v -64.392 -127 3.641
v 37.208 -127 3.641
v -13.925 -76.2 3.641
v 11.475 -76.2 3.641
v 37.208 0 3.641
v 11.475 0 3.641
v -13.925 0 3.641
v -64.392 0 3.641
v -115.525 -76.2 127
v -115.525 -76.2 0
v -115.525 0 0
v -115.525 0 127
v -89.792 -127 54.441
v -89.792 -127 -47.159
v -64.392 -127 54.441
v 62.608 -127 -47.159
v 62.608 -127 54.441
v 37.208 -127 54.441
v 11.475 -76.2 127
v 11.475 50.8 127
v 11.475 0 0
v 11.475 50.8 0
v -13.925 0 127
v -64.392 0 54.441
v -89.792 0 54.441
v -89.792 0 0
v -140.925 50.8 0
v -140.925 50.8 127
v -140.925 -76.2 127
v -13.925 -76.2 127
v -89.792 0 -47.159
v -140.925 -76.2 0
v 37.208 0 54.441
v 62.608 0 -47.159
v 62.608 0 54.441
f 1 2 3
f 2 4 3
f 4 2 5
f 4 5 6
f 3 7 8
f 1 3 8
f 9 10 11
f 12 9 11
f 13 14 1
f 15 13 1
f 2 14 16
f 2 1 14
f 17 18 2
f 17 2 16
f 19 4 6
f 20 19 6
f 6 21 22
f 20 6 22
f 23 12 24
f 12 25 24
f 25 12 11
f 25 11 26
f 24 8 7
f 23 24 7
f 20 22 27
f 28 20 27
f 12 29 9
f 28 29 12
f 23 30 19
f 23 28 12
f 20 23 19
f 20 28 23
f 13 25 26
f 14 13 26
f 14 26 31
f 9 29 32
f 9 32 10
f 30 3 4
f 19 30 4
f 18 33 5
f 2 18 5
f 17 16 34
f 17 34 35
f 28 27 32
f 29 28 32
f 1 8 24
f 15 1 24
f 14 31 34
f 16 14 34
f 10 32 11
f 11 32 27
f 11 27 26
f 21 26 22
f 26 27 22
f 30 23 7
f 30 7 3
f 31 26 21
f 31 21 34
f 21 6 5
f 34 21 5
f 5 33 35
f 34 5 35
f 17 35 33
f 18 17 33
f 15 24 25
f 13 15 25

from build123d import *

# Parameters (mm, degrees)
F1_DEPTH = 127
F3_DEPTH = 127


with BuildPart() as f1:
    # F0 (on Front) → F1 (new body)
    with BuildSketch(Plane.XZ):
        Polygon((-89.792244, 54.44082), (-89.792244, -47.15918), (62.607756, -47.15918), (62.607756, 54.44082), (37.207756, 54.44082), (37.207756, 3.64082), (-64.392244, 3.64082), (-64.392244, 54.44082), align=None)
    extrude(amount=F1_DEPTH)

    # F2 (on Top) → F3 (join)
    with BuildSketch(Plane.XY):
        Polygon((11.475189, 50.8), (-140.924811, 50.8), (-140.924811, -76.2), (-115.524811, -76.2), (-115.524811, 0), (-13.924811, 0), (-13.924811, -76.2), (11.475189, -76.2), align=None)
    extrude(amount=F3_DEPTH)


solid = f1.part
